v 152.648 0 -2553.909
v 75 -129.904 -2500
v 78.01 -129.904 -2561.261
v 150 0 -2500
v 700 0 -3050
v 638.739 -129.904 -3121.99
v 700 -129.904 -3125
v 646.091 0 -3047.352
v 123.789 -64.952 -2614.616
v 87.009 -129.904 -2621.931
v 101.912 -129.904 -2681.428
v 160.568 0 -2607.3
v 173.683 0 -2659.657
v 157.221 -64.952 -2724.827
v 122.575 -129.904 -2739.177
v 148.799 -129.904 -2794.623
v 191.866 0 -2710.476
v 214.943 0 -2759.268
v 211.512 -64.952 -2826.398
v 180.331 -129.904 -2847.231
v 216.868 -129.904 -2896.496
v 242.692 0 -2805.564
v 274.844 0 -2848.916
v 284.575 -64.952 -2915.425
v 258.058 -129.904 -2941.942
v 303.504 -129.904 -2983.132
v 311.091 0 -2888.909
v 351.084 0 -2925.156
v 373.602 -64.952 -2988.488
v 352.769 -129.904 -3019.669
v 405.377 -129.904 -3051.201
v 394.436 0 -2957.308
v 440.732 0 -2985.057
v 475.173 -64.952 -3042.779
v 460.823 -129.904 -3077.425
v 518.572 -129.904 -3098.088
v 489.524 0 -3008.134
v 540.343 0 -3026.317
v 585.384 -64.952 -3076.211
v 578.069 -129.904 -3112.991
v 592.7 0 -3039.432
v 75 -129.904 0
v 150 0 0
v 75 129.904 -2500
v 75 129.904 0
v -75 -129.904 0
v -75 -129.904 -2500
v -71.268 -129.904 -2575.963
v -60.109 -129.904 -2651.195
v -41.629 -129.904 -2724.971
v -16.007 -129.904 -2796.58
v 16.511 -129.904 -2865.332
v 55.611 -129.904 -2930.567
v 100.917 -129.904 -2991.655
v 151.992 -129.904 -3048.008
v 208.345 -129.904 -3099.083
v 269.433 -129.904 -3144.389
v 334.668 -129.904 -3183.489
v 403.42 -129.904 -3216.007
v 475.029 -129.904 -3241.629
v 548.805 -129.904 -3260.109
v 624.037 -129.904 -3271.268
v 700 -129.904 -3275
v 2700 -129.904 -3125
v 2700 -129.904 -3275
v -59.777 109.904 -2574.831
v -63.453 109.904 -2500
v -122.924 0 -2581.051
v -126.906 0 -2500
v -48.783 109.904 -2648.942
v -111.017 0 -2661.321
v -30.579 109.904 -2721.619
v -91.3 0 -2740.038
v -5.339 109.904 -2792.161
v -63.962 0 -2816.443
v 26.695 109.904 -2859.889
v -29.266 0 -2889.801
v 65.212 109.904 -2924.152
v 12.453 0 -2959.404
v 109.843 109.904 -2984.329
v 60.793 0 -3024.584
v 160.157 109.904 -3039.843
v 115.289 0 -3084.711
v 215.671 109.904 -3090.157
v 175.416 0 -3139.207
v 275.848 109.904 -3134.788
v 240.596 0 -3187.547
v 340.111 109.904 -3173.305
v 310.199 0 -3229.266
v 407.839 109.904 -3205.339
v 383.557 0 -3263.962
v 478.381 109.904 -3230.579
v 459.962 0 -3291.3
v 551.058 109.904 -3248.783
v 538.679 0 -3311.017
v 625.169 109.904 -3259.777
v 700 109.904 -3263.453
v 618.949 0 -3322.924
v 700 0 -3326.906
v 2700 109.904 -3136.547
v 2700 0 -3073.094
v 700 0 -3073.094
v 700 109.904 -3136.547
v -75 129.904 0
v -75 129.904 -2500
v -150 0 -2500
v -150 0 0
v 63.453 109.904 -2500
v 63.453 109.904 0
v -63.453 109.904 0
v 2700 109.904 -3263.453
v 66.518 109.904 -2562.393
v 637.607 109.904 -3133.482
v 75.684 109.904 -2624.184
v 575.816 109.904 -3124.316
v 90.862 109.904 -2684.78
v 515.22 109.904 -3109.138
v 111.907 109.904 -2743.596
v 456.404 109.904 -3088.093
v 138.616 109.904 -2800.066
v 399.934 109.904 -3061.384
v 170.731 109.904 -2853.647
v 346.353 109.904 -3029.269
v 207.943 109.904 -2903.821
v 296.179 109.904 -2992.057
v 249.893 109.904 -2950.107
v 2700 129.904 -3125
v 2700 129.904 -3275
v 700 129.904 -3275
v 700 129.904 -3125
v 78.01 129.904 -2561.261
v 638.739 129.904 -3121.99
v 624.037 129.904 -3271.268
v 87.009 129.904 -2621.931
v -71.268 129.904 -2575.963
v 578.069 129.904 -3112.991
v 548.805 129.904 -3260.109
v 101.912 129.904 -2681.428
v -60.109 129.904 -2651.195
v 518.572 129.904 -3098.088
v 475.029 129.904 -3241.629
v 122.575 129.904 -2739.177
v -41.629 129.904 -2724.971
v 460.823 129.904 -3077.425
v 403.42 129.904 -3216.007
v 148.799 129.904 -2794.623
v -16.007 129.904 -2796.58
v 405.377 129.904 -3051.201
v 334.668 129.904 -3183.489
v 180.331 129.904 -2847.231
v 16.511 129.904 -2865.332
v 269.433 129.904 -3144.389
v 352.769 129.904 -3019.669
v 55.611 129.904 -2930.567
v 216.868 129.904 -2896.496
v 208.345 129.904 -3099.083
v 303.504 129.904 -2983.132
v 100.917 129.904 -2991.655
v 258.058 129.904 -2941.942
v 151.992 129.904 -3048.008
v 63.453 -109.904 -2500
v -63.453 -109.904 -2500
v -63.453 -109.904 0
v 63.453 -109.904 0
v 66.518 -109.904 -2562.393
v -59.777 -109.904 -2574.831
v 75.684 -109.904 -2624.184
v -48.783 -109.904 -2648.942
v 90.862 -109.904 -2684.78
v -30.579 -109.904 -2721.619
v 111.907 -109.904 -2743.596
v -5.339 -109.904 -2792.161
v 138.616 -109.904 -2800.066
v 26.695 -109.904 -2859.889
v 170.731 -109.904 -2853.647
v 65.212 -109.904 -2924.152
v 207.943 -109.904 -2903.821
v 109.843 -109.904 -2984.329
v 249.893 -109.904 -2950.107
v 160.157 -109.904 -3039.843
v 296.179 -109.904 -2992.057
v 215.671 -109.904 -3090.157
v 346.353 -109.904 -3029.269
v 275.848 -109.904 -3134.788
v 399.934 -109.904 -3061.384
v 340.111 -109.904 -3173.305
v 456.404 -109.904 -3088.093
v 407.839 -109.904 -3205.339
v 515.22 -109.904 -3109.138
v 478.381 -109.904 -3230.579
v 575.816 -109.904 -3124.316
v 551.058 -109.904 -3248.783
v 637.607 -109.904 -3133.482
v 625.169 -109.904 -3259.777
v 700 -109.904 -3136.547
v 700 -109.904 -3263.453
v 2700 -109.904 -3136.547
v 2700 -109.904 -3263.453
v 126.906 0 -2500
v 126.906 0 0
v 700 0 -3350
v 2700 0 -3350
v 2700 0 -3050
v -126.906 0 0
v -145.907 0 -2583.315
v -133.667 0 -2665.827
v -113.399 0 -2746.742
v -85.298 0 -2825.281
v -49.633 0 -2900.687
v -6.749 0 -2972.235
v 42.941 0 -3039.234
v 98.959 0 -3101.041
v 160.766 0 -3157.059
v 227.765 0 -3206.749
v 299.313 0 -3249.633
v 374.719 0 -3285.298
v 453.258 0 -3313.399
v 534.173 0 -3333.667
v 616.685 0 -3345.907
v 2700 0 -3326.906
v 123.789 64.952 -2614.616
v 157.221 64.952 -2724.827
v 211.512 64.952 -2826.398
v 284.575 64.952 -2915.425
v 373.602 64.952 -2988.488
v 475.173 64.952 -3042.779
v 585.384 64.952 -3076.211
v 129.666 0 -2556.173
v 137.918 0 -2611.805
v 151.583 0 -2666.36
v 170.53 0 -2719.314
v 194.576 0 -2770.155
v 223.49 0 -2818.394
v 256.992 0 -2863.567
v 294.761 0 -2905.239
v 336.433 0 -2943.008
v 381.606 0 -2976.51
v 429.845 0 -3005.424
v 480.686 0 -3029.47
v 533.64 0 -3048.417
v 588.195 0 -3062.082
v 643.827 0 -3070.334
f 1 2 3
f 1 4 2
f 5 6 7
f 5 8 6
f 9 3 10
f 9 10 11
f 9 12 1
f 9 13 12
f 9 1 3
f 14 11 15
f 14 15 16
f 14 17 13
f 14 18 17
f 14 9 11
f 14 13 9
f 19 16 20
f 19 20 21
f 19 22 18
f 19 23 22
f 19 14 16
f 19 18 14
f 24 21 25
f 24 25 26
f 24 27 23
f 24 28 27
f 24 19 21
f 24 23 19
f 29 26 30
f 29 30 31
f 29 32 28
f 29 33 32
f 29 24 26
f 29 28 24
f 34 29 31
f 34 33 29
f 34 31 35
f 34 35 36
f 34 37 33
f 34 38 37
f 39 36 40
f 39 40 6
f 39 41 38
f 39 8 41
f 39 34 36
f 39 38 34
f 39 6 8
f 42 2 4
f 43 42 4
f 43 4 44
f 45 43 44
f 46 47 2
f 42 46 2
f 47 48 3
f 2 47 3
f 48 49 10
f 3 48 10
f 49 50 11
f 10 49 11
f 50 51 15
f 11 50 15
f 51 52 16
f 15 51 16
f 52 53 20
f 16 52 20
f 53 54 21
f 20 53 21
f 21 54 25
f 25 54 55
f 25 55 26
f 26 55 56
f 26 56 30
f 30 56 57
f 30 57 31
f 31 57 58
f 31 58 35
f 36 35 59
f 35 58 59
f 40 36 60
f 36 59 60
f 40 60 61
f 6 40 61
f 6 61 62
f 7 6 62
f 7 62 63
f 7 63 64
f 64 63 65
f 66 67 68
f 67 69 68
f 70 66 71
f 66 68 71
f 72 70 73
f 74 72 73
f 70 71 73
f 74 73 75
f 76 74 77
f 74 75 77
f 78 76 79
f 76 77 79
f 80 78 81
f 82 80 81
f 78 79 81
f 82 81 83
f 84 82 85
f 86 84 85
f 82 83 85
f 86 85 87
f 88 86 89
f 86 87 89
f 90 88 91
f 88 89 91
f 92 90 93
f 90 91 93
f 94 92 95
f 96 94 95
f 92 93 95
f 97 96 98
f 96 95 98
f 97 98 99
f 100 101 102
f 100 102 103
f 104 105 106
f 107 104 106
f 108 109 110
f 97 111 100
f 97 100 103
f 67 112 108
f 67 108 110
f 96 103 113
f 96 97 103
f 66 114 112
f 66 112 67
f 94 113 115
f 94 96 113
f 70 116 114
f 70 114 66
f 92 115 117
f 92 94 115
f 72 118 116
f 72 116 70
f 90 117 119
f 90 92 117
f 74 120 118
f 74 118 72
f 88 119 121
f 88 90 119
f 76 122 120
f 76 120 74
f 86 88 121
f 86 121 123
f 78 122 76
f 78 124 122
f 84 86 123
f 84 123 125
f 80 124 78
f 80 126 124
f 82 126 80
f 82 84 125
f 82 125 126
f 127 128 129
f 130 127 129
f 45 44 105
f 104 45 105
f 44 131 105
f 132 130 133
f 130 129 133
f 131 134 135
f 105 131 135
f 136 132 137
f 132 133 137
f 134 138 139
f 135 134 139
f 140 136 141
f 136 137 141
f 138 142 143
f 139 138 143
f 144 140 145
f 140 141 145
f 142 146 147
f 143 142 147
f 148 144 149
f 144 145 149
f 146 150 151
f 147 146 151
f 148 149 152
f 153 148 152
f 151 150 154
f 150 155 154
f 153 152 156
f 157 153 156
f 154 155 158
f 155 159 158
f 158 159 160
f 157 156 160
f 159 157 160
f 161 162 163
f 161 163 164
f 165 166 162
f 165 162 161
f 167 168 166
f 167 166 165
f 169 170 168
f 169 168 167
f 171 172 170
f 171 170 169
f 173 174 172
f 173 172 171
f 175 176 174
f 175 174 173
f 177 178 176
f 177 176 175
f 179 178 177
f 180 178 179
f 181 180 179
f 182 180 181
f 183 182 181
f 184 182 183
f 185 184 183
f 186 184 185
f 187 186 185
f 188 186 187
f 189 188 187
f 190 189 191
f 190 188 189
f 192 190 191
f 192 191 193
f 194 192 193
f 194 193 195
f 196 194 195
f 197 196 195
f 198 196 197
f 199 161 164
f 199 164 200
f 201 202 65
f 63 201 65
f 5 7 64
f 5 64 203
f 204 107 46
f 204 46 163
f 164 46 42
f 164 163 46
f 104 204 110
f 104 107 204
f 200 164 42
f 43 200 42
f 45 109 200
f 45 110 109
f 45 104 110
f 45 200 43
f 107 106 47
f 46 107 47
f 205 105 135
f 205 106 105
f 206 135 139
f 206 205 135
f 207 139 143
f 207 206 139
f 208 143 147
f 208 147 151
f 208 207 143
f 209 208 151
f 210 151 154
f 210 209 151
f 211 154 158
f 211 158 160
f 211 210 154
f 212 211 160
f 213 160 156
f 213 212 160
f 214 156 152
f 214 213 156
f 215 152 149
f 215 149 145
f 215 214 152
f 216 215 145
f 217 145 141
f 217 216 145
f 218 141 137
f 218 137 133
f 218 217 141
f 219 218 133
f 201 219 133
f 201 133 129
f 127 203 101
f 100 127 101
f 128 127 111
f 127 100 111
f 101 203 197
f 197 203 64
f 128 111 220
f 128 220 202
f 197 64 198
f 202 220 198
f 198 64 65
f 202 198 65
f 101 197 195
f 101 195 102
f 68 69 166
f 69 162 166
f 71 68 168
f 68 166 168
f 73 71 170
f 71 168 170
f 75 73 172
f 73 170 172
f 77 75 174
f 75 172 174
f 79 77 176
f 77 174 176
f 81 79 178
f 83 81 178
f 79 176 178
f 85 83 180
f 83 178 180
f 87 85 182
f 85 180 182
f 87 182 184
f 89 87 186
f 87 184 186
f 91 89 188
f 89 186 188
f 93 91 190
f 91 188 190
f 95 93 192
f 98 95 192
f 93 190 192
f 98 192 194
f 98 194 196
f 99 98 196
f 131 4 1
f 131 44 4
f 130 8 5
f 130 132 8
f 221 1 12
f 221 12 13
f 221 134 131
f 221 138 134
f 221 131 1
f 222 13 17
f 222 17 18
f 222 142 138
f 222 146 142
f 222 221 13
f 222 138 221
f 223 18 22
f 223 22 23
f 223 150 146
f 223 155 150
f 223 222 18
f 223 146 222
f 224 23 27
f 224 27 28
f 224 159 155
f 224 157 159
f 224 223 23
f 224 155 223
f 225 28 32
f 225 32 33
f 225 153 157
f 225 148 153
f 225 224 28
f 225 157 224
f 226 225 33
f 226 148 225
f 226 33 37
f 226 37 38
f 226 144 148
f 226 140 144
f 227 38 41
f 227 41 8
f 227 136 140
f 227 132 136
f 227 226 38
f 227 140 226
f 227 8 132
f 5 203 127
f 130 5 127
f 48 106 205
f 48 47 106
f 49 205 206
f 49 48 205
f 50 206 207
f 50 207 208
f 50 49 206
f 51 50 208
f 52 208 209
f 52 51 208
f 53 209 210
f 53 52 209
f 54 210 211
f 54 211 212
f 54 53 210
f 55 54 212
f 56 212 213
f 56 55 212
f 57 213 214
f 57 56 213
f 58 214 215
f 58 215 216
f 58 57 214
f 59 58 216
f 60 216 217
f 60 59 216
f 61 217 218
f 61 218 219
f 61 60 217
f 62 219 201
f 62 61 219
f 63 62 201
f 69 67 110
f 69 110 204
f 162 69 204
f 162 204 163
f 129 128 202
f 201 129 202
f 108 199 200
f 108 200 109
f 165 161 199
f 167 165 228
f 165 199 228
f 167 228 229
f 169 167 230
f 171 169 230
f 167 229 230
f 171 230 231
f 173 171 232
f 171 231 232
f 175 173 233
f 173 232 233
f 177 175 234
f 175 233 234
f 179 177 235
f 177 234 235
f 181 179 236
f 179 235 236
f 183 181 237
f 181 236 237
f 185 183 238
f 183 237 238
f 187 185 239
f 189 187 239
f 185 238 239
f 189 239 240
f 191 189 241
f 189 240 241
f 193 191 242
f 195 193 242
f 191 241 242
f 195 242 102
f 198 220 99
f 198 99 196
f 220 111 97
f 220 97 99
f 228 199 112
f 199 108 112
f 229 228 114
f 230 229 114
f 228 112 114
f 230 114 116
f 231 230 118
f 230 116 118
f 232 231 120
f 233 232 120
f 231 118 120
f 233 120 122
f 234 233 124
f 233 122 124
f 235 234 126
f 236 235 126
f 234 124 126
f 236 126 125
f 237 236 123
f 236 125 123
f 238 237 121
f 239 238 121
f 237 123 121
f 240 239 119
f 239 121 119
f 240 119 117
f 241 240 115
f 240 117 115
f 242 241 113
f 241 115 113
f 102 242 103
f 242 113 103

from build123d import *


with BuildPart() as part:
    # Balayage1: sweep along a path in Esquisse3
    with BuildLine(Plane(origin=(0, 0, 0), x_dir=(1, 0, 0), z_dir=(0, 1, 0))) as balayage1_path:
        Line((0, 0), (0, 2500))
        ThreePointArc((0, 2500), (205.025253169, 2994.974746831), (700, 3200))
        Line((700, 3200), (2700, 3200))
    # Esquisse2 → Balayage1 (sweep)
    with BuildSketch(Plane.XY):
        Polygon((75, 129.903810568), (-75, 129.903810568), (-150, 0), (-75, -129.903810568), (75, -129.903810568), (150, 0), align=None)
    sweep(path=balayage1_path.line)

    # Enlèvement de matière-Balayage1: sweep along a path in Esquisse5
    with BuildLine(Plane(origin=(0, 129.903810568, 0), x_dir=(1, 0, 0), z_dir=(0, 1, 0))) as enl_vement_de_mati_re_balayage1_path:
        Line((150, 0), (150, 2500))
        ThreePointArc((150, 2500), (311.091270347, 2888.908729653), (700, 3050))
        Line((700, 3050), (2700, 3050))
    # Esquisse4 → Enlèvement de matière-Balayage1 (sweep, cut)
    with BuildSketch(Plane.XY):
        Polygon((126.905989232, 0), (63.452994616, 109.903810568), (-63.452994616, 109.903810568), (-126.905989232, 0), (-63.452994616, -109.903810568), (63.452994616, -109.903810568), align=None)
    sweep(path=enl_vement_de_mati_re_balayage1_path.line, mode=Mode.SUBTRACT)


solid = part.part
